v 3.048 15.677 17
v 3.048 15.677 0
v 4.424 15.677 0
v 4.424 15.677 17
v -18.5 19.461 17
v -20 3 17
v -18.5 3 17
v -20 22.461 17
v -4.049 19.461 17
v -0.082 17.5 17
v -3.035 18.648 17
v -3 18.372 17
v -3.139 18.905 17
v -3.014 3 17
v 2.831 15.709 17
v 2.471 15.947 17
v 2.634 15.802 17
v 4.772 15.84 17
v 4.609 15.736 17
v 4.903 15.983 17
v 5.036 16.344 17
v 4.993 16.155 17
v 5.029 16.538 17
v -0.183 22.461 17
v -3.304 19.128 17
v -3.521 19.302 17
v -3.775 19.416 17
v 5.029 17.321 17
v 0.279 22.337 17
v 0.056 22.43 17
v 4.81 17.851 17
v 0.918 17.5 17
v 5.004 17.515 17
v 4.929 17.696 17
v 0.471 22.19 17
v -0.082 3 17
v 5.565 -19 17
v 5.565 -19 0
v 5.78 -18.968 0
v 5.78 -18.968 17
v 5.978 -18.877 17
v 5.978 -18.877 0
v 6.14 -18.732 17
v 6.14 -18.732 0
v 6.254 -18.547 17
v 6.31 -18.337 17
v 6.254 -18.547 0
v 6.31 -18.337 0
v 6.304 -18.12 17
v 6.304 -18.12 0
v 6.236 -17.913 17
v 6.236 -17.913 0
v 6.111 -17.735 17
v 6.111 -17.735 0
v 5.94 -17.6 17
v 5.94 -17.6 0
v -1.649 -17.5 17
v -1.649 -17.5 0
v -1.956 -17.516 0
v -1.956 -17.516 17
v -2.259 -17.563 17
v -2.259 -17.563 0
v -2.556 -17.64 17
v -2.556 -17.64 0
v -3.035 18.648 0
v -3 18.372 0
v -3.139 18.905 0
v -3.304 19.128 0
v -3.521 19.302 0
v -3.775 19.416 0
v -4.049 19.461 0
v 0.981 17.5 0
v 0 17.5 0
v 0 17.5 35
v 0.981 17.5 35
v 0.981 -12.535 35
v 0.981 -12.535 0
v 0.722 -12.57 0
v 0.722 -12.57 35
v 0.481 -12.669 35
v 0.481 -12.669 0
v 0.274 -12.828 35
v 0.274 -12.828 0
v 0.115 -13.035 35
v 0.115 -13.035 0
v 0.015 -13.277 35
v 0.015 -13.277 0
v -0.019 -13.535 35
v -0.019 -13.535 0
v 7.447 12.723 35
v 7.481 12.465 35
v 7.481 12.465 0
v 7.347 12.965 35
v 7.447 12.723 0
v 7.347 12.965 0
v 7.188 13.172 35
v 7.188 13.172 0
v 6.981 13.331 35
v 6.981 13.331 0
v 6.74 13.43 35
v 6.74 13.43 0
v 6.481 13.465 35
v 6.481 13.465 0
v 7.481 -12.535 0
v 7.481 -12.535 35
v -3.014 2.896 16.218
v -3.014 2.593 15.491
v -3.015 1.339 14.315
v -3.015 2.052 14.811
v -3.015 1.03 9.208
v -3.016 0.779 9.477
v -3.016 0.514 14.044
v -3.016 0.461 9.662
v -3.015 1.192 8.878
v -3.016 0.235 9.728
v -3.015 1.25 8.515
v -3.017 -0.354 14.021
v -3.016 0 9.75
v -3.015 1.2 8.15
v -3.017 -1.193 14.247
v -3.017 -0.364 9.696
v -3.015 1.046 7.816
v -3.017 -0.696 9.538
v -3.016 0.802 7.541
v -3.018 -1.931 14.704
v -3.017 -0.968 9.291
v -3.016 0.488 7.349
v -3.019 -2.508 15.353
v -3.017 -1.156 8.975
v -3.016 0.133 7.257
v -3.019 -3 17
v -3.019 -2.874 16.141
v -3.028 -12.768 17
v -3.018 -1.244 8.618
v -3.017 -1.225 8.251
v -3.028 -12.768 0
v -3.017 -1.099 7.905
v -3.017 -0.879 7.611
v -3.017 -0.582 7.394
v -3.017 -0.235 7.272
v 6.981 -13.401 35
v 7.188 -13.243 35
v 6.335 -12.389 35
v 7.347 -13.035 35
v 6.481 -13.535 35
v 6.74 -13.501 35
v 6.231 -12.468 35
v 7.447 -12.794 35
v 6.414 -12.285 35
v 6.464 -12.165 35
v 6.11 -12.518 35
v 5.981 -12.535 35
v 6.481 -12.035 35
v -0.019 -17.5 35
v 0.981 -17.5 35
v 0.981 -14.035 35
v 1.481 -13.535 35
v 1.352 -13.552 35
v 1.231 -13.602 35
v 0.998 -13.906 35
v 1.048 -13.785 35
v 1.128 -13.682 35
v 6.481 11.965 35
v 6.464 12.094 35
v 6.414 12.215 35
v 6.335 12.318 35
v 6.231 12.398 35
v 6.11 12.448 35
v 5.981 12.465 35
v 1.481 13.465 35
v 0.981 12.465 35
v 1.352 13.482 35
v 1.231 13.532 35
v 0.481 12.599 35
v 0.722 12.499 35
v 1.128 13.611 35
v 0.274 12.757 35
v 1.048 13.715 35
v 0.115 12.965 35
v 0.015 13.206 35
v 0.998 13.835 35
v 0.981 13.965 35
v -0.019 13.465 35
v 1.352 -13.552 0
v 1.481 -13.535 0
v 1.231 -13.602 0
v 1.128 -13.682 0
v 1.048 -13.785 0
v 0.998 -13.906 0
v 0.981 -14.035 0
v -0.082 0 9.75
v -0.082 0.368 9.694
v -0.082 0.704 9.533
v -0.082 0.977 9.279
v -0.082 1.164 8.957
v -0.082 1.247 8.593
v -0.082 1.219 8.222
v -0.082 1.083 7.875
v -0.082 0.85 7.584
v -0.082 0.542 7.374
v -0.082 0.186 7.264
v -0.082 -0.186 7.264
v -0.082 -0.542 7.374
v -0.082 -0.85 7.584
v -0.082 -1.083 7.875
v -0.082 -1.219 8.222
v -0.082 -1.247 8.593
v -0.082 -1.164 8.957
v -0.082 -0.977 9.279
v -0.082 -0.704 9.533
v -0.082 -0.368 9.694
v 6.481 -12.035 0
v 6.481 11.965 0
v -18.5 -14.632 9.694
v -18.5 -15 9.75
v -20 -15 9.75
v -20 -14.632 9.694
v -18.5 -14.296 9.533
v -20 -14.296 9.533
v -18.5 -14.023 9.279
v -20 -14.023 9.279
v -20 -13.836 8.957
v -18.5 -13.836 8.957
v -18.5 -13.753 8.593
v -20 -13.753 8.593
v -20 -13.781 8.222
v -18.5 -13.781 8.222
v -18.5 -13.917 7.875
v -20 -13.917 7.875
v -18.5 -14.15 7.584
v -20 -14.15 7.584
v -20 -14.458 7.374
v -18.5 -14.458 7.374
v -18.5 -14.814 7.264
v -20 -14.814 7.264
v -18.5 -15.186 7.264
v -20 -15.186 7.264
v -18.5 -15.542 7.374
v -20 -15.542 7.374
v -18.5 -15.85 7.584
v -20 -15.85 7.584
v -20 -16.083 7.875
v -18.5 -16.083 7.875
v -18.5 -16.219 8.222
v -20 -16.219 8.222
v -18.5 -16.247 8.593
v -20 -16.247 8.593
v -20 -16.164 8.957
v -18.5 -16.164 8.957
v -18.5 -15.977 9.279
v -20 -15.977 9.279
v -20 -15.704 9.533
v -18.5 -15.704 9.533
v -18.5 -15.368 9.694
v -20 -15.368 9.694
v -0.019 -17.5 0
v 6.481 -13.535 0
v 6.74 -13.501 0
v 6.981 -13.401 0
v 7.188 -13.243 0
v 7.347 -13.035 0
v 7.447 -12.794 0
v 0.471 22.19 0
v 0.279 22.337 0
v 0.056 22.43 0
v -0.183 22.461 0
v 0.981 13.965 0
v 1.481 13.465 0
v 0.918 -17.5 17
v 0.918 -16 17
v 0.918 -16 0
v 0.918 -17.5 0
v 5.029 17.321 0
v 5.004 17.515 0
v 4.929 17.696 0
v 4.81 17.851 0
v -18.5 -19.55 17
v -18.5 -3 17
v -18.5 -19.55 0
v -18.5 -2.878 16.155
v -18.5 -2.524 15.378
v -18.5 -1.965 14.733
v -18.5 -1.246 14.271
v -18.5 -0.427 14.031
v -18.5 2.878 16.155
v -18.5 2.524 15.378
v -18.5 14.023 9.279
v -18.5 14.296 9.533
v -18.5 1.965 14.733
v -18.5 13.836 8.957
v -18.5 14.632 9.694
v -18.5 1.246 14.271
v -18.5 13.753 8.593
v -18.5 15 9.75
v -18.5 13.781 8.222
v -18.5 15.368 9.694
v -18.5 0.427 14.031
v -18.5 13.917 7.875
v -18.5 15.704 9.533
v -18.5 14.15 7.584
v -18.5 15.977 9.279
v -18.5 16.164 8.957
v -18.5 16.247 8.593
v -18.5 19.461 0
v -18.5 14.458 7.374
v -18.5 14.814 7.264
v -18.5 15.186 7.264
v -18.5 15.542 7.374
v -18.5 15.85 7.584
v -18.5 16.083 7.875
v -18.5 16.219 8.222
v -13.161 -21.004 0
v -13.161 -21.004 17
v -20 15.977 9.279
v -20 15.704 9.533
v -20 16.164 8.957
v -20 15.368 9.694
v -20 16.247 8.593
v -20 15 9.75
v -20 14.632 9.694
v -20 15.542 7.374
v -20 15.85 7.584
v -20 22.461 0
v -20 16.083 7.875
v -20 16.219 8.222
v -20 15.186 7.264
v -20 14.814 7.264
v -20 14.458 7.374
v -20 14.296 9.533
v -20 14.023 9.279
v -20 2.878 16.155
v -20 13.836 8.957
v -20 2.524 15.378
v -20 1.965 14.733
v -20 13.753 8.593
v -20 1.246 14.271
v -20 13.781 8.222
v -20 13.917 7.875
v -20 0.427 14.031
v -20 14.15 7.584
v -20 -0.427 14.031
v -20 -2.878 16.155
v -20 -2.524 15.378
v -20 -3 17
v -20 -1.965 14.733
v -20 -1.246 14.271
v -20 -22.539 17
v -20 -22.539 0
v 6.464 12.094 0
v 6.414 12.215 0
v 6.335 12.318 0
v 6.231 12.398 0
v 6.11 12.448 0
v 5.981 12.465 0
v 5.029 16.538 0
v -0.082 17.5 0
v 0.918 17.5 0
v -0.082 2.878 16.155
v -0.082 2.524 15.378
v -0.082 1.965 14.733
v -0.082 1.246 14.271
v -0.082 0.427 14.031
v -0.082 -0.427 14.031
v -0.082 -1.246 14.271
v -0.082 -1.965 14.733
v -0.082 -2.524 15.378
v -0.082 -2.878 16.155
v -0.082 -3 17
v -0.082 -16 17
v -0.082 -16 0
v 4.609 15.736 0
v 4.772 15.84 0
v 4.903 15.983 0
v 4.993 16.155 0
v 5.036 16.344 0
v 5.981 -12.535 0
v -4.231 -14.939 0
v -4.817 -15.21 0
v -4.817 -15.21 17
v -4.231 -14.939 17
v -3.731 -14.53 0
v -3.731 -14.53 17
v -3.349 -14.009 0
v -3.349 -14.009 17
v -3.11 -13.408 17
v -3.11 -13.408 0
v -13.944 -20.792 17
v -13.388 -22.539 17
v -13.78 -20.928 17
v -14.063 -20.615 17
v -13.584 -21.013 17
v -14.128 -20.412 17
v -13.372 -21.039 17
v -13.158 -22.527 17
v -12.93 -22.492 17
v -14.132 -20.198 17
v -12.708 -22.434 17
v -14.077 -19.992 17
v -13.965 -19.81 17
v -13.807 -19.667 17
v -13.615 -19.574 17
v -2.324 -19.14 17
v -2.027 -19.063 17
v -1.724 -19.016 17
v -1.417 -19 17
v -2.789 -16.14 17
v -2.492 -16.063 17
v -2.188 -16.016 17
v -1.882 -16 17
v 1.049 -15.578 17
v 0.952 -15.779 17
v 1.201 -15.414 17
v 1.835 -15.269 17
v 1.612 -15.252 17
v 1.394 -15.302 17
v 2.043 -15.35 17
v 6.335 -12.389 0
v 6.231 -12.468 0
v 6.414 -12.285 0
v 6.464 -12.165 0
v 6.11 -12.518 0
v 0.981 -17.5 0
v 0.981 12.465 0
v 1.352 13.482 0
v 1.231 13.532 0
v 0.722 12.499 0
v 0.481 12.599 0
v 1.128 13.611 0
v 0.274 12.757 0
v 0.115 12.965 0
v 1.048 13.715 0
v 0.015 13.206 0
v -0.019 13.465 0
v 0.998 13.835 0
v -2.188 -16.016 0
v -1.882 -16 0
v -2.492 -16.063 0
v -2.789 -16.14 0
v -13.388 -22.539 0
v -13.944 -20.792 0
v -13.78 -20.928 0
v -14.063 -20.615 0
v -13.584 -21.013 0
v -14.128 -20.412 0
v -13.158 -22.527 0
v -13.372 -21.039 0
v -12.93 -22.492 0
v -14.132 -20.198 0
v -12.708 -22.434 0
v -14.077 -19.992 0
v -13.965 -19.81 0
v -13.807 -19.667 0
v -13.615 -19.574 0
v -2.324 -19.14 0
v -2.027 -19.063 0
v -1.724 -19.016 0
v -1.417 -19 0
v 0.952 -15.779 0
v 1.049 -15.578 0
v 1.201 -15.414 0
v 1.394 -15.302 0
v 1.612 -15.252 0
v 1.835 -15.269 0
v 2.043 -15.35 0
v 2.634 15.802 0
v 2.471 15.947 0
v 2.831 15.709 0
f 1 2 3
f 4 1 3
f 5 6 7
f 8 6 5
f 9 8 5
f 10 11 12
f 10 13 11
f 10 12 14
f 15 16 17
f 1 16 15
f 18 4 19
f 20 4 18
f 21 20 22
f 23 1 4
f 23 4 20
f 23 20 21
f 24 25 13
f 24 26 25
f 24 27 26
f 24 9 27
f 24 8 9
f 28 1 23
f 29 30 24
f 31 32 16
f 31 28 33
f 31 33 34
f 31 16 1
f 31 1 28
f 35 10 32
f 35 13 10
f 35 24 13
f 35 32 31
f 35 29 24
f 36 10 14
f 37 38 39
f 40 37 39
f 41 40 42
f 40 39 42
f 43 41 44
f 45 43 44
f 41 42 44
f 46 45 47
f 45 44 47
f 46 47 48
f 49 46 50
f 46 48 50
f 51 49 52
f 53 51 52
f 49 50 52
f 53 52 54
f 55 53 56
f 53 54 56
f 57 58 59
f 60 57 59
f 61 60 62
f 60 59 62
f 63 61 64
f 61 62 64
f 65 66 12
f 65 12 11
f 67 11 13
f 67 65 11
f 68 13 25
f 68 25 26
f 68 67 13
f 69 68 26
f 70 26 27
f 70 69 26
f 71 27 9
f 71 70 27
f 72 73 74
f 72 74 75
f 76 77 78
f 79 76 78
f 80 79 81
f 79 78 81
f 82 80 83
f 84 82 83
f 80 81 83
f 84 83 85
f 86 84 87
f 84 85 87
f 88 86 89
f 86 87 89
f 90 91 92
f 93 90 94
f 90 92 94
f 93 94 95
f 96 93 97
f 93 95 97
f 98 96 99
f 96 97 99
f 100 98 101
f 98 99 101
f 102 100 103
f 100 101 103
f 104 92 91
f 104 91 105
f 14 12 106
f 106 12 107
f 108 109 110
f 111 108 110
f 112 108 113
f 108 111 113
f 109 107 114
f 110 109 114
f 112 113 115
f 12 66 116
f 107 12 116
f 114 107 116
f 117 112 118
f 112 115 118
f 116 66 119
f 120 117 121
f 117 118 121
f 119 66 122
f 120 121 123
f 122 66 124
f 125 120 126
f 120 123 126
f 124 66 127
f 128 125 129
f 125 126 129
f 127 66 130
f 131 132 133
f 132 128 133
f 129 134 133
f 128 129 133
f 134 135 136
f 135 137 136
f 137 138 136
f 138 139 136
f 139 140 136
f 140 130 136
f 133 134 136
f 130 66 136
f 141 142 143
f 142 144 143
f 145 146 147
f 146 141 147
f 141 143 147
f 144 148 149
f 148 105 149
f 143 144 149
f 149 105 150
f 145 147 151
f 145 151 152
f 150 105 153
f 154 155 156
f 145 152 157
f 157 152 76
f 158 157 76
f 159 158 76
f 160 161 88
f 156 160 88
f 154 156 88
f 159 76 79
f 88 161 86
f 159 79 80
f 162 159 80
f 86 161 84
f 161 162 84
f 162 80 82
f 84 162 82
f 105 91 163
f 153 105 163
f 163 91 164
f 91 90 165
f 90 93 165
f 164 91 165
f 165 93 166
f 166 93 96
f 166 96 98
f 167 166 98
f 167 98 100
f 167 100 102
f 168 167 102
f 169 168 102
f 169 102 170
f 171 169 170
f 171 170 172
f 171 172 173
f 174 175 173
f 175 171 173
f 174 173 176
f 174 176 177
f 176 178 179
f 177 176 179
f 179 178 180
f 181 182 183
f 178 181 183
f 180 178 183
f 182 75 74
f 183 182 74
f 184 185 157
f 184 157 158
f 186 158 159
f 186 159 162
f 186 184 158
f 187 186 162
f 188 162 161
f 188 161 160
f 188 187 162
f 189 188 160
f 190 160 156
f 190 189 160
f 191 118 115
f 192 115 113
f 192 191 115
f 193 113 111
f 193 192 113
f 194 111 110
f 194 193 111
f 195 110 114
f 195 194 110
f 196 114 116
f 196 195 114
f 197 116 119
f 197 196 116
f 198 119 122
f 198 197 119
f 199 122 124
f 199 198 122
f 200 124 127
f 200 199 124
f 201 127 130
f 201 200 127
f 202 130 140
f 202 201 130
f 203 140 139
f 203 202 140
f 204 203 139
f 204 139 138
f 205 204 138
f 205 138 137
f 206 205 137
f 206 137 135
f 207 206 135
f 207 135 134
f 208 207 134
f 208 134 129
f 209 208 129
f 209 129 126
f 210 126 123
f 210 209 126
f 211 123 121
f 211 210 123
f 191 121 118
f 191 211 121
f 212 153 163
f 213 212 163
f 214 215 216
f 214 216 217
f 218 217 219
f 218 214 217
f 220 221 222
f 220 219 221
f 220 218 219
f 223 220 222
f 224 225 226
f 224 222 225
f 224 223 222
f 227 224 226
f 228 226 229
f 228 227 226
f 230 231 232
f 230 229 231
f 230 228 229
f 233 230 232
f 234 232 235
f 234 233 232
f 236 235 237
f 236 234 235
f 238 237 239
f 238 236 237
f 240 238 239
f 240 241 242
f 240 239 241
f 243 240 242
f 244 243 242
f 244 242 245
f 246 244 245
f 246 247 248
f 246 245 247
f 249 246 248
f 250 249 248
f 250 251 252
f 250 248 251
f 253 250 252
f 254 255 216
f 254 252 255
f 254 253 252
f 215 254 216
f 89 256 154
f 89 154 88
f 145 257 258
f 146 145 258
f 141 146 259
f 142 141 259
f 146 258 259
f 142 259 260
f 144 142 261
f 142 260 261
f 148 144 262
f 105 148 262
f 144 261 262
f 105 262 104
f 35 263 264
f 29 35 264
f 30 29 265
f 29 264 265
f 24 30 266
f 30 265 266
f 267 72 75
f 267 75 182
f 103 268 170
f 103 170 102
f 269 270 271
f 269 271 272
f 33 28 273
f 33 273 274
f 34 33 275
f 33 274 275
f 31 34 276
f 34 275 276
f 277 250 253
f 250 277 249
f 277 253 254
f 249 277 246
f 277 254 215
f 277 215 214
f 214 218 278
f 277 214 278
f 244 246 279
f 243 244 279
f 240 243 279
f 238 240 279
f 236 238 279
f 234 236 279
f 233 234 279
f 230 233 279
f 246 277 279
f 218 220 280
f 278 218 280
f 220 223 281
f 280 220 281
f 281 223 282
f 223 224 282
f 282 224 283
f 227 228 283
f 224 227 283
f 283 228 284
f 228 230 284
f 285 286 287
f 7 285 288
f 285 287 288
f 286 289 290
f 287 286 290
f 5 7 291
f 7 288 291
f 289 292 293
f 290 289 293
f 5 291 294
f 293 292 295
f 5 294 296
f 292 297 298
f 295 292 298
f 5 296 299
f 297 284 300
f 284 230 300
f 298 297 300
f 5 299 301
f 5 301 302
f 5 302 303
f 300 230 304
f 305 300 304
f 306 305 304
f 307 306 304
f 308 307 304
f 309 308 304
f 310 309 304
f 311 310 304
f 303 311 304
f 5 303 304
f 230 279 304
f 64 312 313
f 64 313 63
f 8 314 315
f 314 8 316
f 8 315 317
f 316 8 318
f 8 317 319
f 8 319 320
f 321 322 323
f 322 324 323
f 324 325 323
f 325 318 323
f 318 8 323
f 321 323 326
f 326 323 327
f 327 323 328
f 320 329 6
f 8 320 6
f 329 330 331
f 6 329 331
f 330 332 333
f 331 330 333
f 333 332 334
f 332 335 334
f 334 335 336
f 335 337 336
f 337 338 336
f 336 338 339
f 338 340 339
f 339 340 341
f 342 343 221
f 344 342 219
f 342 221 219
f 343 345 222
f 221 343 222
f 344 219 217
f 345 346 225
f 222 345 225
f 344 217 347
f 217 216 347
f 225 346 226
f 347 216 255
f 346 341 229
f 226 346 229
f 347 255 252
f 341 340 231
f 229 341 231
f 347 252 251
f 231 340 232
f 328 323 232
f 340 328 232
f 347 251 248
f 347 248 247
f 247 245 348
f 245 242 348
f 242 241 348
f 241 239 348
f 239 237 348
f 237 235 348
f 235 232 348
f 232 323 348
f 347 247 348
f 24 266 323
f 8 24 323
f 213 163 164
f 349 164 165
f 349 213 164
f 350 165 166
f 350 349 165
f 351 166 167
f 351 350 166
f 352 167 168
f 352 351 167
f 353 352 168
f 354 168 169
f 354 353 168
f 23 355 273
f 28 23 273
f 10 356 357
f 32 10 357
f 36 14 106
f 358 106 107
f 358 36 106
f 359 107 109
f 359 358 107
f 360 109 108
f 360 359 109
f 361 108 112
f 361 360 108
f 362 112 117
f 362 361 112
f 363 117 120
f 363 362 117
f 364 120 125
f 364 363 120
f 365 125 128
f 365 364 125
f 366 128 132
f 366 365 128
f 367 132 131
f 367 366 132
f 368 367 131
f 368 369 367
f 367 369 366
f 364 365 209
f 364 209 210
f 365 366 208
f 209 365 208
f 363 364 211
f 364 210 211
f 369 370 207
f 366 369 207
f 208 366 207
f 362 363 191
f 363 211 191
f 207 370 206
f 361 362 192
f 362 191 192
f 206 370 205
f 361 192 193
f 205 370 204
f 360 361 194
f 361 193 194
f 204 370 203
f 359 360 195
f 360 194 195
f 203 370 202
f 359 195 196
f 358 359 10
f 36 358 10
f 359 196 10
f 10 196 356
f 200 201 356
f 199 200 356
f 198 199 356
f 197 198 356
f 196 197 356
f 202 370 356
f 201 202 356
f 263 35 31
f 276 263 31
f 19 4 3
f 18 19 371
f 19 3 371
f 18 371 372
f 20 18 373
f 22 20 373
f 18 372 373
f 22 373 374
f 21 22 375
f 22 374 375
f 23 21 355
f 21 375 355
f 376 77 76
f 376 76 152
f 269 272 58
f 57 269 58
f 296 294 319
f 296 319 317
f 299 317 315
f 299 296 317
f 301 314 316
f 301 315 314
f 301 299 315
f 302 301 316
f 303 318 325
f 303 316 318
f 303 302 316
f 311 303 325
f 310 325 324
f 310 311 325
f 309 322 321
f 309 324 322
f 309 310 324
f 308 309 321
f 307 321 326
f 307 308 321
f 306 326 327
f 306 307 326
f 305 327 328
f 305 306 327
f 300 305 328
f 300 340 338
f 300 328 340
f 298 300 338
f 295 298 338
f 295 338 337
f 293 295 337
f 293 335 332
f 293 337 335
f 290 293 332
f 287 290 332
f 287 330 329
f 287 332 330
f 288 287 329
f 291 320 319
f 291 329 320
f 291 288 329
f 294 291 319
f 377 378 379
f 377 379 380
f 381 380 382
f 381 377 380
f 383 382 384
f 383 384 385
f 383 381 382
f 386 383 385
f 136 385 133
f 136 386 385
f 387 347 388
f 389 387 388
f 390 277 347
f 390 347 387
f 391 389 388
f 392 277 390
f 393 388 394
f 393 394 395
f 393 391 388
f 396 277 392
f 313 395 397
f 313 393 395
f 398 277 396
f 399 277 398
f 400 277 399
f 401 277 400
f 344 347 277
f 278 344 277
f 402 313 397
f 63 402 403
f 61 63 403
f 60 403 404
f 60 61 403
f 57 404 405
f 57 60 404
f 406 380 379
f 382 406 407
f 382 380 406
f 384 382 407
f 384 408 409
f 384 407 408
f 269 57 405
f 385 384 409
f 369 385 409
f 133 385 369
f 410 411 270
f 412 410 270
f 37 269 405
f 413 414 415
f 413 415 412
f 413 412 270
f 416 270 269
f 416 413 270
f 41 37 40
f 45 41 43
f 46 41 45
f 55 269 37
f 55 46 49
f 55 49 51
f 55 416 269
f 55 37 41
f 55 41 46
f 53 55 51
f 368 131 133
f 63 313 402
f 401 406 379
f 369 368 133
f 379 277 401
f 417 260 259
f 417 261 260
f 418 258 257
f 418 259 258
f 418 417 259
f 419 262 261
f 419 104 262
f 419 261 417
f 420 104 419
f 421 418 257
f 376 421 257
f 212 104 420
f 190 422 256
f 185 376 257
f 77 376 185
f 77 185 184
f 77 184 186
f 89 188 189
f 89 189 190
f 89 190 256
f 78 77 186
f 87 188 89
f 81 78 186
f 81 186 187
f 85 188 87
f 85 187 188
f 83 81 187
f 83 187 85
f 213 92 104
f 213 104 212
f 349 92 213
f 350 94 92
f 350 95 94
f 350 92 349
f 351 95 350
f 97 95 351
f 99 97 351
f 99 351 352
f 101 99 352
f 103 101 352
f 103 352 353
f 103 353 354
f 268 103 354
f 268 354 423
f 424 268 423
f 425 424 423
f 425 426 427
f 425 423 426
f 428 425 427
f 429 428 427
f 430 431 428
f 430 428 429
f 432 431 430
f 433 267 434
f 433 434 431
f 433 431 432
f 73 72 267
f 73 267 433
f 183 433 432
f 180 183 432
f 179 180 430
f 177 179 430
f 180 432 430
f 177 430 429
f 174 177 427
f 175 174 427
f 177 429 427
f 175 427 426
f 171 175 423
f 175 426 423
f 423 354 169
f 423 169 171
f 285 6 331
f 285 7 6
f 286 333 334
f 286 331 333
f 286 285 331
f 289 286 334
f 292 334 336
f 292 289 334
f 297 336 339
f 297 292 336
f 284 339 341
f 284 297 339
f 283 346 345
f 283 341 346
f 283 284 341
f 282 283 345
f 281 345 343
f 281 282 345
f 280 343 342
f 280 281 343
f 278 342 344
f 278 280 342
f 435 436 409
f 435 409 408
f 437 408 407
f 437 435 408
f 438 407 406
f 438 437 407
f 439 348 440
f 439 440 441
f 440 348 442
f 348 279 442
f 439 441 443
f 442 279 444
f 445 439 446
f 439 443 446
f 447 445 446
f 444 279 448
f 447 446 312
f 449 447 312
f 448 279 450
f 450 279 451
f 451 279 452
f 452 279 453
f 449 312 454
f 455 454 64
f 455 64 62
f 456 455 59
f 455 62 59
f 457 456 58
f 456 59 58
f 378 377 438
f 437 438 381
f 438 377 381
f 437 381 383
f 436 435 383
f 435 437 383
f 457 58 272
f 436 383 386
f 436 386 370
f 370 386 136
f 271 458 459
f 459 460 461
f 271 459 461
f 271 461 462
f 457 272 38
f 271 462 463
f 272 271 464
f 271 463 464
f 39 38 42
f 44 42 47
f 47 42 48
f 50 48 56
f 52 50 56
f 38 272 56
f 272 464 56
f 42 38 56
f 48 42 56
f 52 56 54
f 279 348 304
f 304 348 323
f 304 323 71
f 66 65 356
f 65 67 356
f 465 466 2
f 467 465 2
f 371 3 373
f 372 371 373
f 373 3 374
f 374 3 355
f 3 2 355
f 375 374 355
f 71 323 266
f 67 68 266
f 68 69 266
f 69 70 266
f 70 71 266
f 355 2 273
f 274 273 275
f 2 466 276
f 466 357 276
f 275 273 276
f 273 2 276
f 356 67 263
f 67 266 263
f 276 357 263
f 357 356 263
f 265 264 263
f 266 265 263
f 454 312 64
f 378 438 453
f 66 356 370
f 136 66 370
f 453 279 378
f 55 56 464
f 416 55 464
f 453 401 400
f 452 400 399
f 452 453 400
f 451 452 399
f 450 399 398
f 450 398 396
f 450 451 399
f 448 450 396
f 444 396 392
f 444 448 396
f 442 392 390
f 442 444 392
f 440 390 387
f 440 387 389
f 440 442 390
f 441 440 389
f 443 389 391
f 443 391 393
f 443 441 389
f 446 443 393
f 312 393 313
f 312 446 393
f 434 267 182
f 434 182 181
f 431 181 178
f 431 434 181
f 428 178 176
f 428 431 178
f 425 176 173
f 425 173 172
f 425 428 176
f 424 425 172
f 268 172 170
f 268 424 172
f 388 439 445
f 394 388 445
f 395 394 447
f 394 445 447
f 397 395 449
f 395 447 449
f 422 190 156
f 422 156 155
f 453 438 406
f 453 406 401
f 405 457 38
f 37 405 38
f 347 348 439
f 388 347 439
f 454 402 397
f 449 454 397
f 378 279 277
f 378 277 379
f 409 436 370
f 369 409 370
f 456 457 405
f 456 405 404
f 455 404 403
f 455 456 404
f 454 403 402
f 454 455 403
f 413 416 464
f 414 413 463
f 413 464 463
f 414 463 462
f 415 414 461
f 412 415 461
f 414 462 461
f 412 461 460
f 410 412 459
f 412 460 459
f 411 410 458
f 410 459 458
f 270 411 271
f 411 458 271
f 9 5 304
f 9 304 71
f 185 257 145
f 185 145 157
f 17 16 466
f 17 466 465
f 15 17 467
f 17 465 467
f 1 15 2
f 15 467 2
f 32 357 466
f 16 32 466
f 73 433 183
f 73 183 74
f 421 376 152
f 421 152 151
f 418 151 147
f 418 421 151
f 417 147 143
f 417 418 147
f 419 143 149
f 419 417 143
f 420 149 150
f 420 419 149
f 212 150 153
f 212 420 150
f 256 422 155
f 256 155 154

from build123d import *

# Parameters (mm, degrees)
PAD001_DEPTH            = 35
CYLINDER_R              = 1.25
CYLINDER_DEPTH          = 10
CYLINDER_PITCH_ANGLE    = -90
CYLINDER002_R           = 1.25
CYLINDER002_DEPTH       = 10
CYLINDER002_PITCH_ANGLE = -90
CYLINDER001_R           = 1.25
CYLINDER001_DEPTH       = 10
CYLINDER001_PITCH_ANGLE = -90
CYLINDER003_R           = 3
CYLINDER003_DEPTH       = 25
CYLINDER003_PITCH_ANGLE = -90
PAD_DEPTH               = 17


with BuildPart() as din_rail:
    # Sketch001 → Pad001 (new body)
    with BuildSketch(Plane(origin=(0, 17.5, 0), x_dir=(1, 0, 0), z_dir=(0, 0, 1))):
        with BuildLine():
            Line((0, 0), (0.981065, 0))
            Line((0.981065, 0), (0.981065, -3.535445))
            ThreePointArc((0.981065, -3.535445), (1.127512, -3.888998), (1.481065, -4.035445))
            Line((1.481065, -4.035445), (6.481065, -4.035445))
            ThreePointArc((7.481065, -5.035445), (7.188172, -4.328338), (6.481065, -4.035445))
            Line((7.481065, -5.035445), (7.481065, -30.035445))
            ThreePointArc((6.481065, -31.035445), (7.188172, -30.742552), (7.481065, -30.035445))
            Line((6.481065, -31.035445), (1.481065, -31.035445))
            ThreePointArc((1.481065, -31.035445), (1.127512, -31.181892), (0.981065, -31.535445))
            Line((0.981065, -31.535445), (0.981065, -35))
            Line((0.981065, -35), (-0.018935, -35))
            Line((-0.018935, -35), (-0.018935, -31.035445))
            ThreePointArc((0.981065, -30.035445), (0.273958, -30.328338), (-0.018935, -31.035445))
            Line((0.981065, -30.035445), (5.981065, -30.035445))
            ThreePointArc((5.981065, -30.035445), (6.334618, -29.888998), (6.481065, -29.535445))
            Line((6.481065, -29.535445), (6.481065, -5.535445))
            ThreePointArc((6.481065, -5.535445), (6.334618, -5.181892), (5.981065, -5.035445))
            Line((5.981065, -5.035445), (0.981065, -5.035445))
            ThreePointArc((-0.018935, -4.035445), (0.273958, -4.742552), (0.981065, -5.035445))
            Line((-0.018935, -4.035445), (0, 0))
        make_face()
    extrude(amount=PAD001_DEPTH)


with BuildPart() as bracket_hole:
    # Cylinder → Cylinder (new body)
    with BuildSketch(Plane.XY):
        Circle(CYLINDER_R)
    extrude(amount=CYLINDER_DEPTH)


with BuildPart() as bracket_hole_1:
    # Cylinder pitch: moved
    add(bracket_hole.part.rotate(Axis((0, 0, 0), (0, 1, 0)), CYLINDER_PITCH_ANGLE))


with BuildPart() as bracket_hole_2:
    # Cylinder placement: moved
    add(bracket_hole_1.part.moved(Location((5, 0, 8.5))))


with BuildPart() as bracket_hole002:
    # Cylinder002 → Cylinder002 (new body)
    with BuildSketch(Plane.XY):
        Circle(CYLINDER002_R)
    extrude(amount=CYLINDER002_DEPTH)


with BuildPart() as bracket_hole002_1:
    # Cylinder002 pitch: moved
    add(bracket_hole002.part.rotate(Axis((0, 0, 0), (0, 1, 0)), CYLINDER002_PITCH_ANGLE))


with BuildPart() as bracket_hole002_2:
    # Cylinder002 placement: moved
    add(bracket_hole002_1.part.moved(Location((-15, -15, 8.5))))


with BuildPart() as bracket_hole001:
    # Cylinder001 → Cylinder001 (new body)
    with BuildSketch(Plane.XY):
        Circle(CYLINDER001_R)
    extrude(amount=CYLINDER001_DEPTH)


with BuildPart() as bracket_hole001_1:
    # Cylinder001 pitch: moved
    add(bracket_hole001.part.rotate(Axis((0, 0, 0), (0, 1, 0)), CYLINDER001_PITCH_ANGLE))


with BuildPart() as bracket_hole001_2:
    # Cylinder001 placement: moved
    add(bracket_hole001_1.part.moved(Location((-15, 15, 8.5))))


with BuildPart() as cuts:
    # Cylinder003 → Cylinder003 (new body)
    with BuildSketch(Plane.XY):
        Circle(CYLINDER003_R)
    extrude(amount=CYLINDER003_DEPTH)


with BuildPart() as cuts_1:
    # Cylinder003 pitch: moved
    add(cuts.part.rotate(Axis((0, 0, 0), (0, 1, 0)), CYLINDER003_PITCH_ANGLE))


with BuildPart() as cuts_2:
    # Cylinder003 placement: moved
    add(cuts_1.part.moved(Location((0, 0, 17))))

    # Fusion: union bracket hole, bracket hole002, bracket hole001
    add(bracket_hole_2.part)
    add(bracket_hole002_2.part)
    add(bracket_hole001_2.part)


with BuildPart() as bracket:
    # Sketch → Pad (new body)
    with BuildSketch(Plane(origin=(-3, 0, 0), x_dir=(1, 0, 0), z_dir=(0, 0, 1))):
        with BuildLine():
            Line((2.816801, 22.461096), (-17, 22.461096))
            Line((-17, 22.461096), (-17, -22.538904))
            Line((-17, -22.538904), (-10.387825, -22.538904))
            ThreePointArc((-10.387825, -22.538904), (-10.043663, -22.512427), (-9.707601, -22.433617))
            Line((0.675806, -19.140382), (-9.707601, -22.433617))
            ThreePointArc((1.582771, -19), (1.123888, -19.035303), (0.675806, -19.140382))
            Line((1.582771, -19), (8.565389, -19))
            ThreePointArc((8.565389, -19), (9.289833, -18.444114), (8.940389, -17.600481))
            Line((8.940389, -17.600481), (5.043277, -15.350481))
            ThreePointArc((5.043277, -15.350481), (4.293277, -15.350481), (3.918277, -16))
            Line((3.918277, -16), (3.918277, -17.5))
            Line((3.918277, -17.5), (1.350598, -17.5))
            ThreePointArc((1.350598, -17.5), (0.891715, -17.535303), (0.443632, -17.640382))
            Line((-10.161093, -21.003811), (0.443632, -17.640382))
            ThreePointArc((-10.614575, -19.574002), (-11.10273, -20.515646), (-10.161093, -21.003811))
            Line((0.211458, -16.140382), (-10.614575, -19.574002))
            ThreePointArc((1.118424, -16), (0.659541, -16.035303), (0.211458, -16.140382))
            Line((1.118424, -16), (2.918277, -16))
            Line((2.918277, -16), (2.918277, 17.5))
            Line((2.918277, 17.5), (3.918277, 17.5))
            Line((3.918277, 17.5), (5.470804, 15.947472))
            ThreePointArc((5.470804, 15.947472), (5.729046, 15.747843), (6.04763, 15.676816))
            Line((6.04763, 15.676816), (7.424187, 15.676816))
            ThreePointArc((7.424187, 15.676816), (7.903008, 15.983319), (8.029261, 16.537642))
            Line((8.029261, 16.537642), (8.029261, 17.320995))
            ThreePointArc((8.029261, 17.320995), (7.97217, 17.608007), (7.809591, 17.851325))
            Line((3.470662, 22.190257), (7.809591, 17.851325))
            ThreePointArc((3.470662, 22.190257), (3.170668, 22.390707), (2.816801, 22.461096))
        make_face()
        with BuildLine():
            Line((-15.5, 19.461096), (-1.048614, 19.461096))
            ThreePointArc((0, 18.372077), (-0.304486, 19.128252), (-1.048614, 19.461096))
            Line((0, 18.372077), (-0.027789, -12.767681))
            ThreePointArc((-1.817178, -15.210154), (-0.523606, -14.28114), (-0.027789, -12.767681))
            Line((-15.5, -19.549843), (-1.817178, -15.210154))
            Line((-15.5, -19.549843), (-15.5, 19.461096))
        make_face(mode=Mode.SUBTRACT)
    extrude(amount=PAD_DEPTH)

    # Cut: cut cuts
    add(cuts_2.part, mode=Mode.SUBTRACT)


solid = Compound([din_rail.part, bracket.part])
